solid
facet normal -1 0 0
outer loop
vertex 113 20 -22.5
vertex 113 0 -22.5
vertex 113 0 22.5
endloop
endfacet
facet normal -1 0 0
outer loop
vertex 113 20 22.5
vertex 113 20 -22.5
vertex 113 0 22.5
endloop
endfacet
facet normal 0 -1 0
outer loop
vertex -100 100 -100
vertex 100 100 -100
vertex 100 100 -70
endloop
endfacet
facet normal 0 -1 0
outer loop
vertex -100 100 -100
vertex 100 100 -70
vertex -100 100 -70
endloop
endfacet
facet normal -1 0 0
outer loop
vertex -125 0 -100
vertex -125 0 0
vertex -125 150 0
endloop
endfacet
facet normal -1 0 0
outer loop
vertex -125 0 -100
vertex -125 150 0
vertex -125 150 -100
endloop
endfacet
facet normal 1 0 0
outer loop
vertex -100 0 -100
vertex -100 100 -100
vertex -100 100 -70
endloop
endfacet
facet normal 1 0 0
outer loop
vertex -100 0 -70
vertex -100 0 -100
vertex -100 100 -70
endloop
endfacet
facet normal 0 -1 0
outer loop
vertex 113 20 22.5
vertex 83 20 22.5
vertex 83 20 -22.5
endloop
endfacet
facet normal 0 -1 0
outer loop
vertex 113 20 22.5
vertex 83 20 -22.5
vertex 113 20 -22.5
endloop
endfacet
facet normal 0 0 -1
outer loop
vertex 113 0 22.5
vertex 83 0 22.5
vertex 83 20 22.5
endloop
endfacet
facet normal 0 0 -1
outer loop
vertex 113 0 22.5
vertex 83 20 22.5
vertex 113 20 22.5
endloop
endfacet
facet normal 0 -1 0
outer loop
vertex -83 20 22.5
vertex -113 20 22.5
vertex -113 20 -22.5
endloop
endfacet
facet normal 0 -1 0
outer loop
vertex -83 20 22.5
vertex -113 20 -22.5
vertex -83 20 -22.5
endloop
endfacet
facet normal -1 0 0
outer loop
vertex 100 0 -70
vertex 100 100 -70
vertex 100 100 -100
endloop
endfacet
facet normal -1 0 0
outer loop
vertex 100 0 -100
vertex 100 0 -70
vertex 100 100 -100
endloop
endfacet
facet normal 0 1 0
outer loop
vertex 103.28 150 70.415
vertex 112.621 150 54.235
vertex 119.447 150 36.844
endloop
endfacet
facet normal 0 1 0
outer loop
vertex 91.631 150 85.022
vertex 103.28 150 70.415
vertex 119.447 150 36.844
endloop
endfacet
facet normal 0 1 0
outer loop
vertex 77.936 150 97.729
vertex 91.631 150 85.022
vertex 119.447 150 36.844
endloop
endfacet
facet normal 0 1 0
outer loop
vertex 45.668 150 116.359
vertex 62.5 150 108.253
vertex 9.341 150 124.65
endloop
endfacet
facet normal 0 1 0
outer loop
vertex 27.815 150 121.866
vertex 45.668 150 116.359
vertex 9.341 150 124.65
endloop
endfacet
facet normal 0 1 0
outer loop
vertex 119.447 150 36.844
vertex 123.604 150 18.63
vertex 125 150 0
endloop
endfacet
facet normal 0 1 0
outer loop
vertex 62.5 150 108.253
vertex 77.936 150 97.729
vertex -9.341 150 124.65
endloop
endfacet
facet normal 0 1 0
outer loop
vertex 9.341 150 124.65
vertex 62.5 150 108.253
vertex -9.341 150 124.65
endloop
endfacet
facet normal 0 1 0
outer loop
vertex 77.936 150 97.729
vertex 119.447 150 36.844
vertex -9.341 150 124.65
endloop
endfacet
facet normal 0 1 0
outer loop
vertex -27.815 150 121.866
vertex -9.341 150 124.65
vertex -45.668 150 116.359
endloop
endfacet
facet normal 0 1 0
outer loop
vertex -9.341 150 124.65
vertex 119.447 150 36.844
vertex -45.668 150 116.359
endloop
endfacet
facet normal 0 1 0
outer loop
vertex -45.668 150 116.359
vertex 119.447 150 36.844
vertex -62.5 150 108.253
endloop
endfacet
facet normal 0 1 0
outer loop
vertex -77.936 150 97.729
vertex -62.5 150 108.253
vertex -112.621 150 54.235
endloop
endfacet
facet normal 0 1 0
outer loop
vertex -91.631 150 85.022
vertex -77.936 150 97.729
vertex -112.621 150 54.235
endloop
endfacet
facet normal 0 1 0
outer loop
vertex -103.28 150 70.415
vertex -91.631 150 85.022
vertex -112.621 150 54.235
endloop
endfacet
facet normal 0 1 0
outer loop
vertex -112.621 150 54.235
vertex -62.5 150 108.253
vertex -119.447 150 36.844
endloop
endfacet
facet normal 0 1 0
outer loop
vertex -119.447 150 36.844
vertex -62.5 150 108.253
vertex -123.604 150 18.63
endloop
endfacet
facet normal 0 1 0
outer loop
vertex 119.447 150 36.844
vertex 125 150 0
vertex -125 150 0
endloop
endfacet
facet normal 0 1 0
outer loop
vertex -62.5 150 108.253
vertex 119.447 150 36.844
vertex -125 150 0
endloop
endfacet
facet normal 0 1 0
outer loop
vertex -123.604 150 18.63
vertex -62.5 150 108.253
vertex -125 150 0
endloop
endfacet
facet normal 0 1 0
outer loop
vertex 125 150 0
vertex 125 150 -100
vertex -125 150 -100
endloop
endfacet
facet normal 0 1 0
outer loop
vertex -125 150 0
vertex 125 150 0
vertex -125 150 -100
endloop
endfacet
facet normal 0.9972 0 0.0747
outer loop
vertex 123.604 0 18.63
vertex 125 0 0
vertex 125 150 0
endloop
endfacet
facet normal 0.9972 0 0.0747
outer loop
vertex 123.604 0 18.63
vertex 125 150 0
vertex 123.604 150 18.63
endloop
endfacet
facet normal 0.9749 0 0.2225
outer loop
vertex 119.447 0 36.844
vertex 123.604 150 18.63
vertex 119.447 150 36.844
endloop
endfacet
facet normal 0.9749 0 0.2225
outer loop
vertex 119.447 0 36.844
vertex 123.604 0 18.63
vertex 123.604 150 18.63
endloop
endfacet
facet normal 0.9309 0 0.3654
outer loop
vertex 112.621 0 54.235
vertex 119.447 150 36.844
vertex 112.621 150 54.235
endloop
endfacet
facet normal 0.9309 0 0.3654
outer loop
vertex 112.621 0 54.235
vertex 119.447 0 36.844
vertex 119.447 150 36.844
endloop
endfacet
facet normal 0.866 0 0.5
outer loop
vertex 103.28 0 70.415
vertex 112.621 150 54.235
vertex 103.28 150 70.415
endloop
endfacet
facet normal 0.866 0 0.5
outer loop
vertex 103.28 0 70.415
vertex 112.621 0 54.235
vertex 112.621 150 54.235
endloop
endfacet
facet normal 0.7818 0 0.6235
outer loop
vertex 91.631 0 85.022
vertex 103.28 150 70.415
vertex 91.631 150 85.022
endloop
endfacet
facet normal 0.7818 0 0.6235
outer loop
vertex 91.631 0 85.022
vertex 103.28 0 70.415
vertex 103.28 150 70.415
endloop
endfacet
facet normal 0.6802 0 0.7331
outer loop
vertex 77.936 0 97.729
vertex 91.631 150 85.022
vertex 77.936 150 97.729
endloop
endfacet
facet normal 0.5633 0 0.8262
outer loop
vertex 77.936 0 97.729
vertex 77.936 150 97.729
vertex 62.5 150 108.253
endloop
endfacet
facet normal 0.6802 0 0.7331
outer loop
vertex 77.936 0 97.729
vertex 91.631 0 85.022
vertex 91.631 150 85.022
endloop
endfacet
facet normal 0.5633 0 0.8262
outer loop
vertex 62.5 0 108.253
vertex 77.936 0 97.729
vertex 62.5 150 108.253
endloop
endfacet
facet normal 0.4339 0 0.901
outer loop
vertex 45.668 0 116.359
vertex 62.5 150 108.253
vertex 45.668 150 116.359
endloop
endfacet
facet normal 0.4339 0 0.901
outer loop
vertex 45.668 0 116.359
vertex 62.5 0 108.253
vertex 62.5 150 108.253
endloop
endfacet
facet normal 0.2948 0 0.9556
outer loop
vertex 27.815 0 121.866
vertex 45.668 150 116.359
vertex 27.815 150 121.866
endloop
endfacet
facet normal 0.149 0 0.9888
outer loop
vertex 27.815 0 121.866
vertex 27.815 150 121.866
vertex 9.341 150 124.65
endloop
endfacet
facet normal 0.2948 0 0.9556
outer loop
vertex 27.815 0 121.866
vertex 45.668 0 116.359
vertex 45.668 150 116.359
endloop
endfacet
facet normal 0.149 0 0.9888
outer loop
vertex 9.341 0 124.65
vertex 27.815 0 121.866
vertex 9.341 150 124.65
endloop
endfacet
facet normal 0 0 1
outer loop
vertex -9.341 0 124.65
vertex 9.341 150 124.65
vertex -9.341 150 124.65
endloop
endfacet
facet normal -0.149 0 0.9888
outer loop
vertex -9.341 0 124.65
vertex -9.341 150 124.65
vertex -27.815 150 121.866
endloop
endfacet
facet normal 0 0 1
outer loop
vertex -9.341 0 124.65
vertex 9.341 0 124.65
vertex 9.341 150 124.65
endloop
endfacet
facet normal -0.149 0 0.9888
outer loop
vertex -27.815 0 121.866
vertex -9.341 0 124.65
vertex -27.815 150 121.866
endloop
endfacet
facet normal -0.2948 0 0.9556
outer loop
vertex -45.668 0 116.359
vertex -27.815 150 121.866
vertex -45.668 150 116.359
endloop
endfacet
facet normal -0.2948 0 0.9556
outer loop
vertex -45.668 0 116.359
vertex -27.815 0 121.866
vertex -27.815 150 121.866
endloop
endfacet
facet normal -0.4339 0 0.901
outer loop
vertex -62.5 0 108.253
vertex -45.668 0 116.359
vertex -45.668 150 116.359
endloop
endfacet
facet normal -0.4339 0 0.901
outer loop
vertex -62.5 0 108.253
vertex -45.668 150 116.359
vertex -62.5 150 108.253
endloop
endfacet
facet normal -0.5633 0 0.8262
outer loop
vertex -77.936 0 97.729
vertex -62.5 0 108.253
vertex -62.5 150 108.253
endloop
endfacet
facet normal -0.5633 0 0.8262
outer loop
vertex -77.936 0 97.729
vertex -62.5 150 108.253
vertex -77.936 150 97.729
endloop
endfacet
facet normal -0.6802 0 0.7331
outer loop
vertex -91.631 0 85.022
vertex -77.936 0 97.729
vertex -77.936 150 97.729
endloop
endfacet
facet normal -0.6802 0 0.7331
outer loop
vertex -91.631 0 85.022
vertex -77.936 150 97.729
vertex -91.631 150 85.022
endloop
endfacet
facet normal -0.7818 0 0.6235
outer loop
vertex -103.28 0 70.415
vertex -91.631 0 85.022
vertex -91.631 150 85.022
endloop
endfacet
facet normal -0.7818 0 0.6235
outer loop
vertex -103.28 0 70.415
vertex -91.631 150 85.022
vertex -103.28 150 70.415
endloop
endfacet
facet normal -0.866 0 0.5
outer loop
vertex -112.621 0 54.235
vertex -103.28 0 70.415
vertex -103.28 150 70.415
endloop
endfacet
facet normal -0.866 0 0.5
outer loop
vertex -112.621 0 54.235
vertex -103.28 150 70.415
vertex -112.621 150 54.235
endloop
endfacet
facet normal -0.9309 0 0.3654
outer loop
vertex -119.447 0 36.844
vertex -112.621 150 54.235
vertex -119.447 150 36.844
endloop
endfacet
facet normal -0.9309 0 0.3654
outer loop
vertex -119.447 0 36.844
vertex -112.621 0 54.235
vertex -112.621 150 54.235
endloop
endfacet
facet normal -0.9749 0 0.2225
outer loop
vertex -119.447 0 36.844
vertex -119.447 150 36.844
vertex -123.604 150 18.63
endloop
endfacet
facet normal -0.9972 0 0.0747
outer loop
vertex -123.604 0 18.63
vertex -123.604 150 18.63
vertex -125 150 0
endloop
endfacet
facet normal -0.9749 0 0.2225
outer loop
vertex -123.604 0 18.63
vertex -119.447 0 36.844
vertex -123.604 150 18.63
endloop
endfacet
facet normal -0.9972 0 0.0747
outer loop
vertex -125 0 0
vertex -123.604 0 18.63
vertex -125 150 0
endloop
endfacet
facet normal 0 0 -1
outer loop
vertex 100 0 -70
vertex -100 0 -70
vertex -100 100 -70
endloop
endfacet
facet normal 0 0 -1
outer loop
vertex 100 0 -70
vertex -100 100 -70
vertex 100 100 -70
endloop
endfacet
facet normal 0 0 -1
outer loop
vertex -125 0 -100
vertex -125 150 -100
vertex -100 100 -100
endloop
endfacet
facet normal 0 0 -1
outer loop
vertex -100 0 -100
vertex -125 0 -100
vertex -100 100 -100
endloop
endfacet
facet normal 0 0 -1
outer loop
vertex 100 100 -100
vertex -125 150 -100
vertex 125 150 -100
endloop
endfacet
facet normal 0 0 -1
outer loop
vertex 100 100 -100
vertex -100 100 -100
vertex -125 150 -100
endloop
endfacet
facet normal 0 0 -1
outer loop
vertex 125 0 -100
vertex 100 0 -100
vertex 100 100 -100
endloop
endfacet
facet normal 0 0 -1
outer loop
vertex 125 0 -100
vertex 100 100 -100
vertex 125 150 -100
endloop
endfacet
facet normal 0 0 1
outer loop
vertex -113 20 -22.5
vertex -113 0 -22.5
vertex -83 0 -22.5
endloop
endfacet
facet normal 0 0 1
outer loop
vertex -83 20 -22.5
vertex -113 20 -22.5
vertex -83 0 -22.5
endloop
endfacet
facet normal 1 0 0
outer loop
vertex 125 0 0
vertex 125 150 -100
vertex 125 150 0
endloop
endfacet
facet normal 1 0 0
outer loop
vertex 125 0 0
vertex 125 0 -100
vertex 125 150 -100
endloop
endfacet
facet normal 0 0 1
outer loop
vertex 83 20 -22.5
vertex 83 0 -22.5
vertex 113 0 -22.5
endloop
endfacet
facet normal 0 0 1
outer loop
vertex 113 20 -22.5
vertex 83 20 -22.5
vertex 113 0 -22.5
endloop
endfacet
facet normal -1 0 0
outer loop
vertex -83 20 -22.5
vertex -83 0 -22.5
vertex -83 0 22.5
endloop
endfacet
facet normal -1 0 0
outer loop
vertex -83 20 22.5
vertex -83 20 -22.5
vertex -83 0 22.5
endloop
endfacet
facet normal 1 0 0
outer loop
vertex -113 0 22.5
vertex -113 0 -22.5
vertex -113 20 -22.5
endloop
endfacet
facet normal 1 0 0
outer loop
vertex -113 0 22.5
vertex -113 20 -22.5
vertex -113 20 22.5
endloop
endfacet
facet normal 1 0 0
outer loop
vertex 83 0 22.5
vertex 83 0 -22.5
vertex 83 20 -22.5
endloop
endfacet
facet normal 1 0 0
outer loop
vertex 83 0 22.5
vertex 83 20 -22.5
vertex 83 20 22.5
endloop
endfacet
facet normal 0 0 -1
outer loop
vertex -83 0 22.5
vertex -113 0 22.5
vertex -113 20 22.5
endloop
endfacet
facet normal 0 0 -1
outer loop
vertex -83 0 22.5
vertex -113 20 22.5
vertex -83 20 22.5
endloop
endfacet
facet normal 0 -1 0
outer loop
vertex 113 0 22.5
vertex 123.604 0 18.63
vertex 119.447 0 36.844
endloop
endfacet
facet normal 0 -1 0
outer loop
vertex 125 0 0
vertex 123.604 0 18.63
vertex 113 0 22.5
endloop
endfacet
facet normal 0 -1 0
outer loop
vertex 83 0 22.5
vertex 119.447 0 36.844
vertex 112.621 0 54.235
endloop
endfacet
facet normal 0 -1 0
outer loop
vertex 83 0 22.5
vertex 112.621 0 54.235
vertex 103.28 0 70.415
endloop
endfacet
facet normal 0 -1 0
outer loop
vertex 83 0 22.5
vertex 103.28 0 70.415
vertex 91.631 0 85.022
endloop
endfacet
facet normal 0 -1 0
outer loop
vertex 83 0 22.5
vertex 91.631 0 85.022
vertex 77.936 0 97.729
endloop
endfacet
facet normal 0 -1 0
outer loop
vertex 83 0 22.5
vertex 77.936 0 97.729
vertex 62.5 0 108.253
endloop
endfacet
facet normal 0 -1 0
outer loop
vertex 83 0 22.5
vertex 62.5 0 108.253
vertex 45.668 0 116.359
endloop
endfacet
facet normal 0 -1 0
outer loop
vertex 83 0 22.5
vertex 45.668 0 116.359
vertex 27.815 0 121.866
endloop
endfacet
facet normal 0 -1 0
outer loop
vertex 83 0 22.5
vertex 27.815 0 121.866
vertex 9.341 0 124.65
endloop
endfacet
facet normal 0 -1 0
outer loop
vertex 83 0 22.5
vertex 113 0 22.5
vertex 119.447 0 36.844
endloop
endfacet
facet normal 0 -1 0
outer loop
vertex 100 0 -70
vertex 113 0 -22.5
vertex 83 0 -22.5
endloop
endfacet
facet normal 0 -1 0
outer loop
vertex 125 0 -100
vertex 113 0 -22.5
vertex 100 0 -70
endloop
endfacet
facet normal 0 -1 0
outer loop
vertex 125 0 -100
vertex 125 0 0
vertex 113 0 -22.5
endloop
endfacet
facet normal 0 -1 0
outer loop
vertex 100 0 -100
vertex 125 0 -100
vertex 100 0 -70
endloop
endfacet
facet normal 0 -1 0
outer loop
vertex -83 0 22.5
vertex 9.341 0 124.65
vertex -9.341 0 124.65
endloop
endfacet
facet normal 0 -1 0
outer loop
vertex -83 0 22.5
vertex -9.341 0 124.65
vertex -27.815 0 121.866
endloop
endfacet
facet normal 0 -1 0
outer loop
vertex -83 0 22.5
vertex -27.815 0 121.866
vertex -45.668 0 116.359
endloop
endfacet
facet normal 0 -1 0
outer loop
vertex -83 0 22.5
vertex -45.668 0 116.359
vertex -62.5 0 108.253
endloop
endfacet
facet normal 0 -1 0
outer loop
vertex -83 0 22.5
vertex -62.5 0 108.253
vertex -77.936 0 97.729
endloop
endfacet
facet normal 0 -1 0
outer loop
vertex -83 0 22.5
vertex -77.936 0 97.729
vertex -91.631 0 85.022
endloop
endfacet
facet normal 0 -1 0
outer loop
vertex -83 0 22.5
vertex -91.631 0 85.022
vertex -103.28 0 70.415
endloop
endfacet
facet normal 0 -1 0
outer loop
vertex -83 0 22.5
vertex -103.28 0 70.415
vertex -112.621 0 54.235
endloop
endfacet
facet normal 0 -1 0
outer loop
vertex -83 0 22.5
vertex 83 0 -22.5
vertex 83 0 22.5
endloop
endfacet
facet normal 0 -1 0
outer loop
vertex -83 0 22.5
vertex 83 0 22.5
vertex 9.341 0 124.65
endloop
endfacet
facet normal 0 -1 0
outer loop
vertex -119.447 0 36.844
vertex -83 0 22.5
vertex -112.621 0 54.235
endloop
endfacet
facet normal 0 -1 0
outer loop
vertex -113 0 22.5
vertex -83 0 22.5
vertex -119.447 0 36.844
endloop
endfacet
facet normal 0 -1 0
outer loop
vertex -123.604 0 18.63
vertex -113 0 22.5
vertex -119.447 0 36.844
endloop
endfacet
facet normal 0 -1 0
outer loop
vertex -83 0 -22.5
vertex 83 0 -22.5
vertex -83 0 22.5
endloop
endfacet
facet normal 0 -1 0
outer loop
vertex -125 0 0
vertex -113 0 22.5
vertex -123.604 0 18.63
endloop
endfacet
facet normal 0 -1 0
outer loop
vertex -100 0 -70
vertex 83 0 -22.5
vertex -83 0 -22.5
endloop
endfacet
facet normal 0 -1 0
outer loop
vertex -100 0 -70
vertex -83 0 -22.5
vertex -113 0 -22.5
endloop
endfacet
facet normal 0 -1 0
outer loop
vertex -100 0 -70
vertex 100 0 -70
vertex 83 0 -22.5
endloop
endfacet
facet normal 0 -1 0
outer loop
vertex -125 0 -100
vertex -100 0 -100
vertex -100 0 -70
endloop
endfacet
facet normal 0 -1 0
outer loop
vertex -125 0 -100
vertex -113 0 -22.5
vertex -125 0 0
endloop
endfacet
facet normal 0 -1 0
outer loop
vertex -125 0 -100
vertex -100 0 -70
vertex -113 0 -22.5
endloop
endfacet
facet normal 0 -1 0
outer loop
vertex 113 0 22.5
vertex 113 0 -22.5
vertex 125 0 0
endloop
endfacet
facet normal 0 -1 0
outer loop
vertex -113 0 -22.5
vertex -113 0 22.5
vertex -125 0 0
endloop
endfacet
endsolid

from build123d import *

# Parameters (mm, degrees)
BOSS_EXTRUDE1_DEPTH = 100
BOSS_EXTRUDE2_DEPTH = 50
SKETCH5_W           = 30
SKETCH5_H           = 45
CUT_EXTRUDE1_DEPTH  = 20


with BuildPart() as part:
    # Sketch3 → Boss-Extrude1 (new body)
    with BuildSketch(Plane(origin=(0, 0, 0), x_dir=(1, 0, 0), z_dir=(0, 1, 0))):
        with BuildLine():
            Line((-125, 0), (-125, 100))
            Line((-125, 100), (-100, 100))
            Line((-100, 100), (-100, 70))
            Line((-100, 70), (100, 70))
            Line((100, 70), (100, 100))
            Line((100, 100), (125, 100))
            Line((125, 100), (125, 0))
            ThreePointArc((125, 0), (0, -125), (-125, 0))
        make_face()
    extrude(amount=BOSS_EXTRUDE1_DEPTH)

    # Sketch4 → Boss-Extrude2 (add)
    with BuildSketch(Plane(origin=(0, 100, 0), x_dir=(1, 0, 0), z_dir=(0, 1, 0))):
        with BuildLine():
            Line((-100, 100), (100, 100))
            Line((100, 100), (125, 100))
            Line((125, 100), (125, 0))
            ThreePointArc((125, 0), (0, -125), (-125, 0))
            Line((-125, 0), (-125, 100))
            Line((-125, 100), (-100, 100))
        make_face()
    extrude(amount=BOSS_EXTRUDE2_DEPTH)

    # Sketch5 → Cut-Extrude1 (cut)
    with BuildSketch(Plane.XZ):
        with Locations((-98, 0)):
            Rectangle(SKETCH5_W, SKETCH5_H)
        with Locations((98, 0)):
            Rectangle(SKETCH5_W, SKETCH5_H)
    extrude(amount=-CUT_EXTRUDE1_DEPTH, mode=Mode.SUBTRACT)


solid = part.part
